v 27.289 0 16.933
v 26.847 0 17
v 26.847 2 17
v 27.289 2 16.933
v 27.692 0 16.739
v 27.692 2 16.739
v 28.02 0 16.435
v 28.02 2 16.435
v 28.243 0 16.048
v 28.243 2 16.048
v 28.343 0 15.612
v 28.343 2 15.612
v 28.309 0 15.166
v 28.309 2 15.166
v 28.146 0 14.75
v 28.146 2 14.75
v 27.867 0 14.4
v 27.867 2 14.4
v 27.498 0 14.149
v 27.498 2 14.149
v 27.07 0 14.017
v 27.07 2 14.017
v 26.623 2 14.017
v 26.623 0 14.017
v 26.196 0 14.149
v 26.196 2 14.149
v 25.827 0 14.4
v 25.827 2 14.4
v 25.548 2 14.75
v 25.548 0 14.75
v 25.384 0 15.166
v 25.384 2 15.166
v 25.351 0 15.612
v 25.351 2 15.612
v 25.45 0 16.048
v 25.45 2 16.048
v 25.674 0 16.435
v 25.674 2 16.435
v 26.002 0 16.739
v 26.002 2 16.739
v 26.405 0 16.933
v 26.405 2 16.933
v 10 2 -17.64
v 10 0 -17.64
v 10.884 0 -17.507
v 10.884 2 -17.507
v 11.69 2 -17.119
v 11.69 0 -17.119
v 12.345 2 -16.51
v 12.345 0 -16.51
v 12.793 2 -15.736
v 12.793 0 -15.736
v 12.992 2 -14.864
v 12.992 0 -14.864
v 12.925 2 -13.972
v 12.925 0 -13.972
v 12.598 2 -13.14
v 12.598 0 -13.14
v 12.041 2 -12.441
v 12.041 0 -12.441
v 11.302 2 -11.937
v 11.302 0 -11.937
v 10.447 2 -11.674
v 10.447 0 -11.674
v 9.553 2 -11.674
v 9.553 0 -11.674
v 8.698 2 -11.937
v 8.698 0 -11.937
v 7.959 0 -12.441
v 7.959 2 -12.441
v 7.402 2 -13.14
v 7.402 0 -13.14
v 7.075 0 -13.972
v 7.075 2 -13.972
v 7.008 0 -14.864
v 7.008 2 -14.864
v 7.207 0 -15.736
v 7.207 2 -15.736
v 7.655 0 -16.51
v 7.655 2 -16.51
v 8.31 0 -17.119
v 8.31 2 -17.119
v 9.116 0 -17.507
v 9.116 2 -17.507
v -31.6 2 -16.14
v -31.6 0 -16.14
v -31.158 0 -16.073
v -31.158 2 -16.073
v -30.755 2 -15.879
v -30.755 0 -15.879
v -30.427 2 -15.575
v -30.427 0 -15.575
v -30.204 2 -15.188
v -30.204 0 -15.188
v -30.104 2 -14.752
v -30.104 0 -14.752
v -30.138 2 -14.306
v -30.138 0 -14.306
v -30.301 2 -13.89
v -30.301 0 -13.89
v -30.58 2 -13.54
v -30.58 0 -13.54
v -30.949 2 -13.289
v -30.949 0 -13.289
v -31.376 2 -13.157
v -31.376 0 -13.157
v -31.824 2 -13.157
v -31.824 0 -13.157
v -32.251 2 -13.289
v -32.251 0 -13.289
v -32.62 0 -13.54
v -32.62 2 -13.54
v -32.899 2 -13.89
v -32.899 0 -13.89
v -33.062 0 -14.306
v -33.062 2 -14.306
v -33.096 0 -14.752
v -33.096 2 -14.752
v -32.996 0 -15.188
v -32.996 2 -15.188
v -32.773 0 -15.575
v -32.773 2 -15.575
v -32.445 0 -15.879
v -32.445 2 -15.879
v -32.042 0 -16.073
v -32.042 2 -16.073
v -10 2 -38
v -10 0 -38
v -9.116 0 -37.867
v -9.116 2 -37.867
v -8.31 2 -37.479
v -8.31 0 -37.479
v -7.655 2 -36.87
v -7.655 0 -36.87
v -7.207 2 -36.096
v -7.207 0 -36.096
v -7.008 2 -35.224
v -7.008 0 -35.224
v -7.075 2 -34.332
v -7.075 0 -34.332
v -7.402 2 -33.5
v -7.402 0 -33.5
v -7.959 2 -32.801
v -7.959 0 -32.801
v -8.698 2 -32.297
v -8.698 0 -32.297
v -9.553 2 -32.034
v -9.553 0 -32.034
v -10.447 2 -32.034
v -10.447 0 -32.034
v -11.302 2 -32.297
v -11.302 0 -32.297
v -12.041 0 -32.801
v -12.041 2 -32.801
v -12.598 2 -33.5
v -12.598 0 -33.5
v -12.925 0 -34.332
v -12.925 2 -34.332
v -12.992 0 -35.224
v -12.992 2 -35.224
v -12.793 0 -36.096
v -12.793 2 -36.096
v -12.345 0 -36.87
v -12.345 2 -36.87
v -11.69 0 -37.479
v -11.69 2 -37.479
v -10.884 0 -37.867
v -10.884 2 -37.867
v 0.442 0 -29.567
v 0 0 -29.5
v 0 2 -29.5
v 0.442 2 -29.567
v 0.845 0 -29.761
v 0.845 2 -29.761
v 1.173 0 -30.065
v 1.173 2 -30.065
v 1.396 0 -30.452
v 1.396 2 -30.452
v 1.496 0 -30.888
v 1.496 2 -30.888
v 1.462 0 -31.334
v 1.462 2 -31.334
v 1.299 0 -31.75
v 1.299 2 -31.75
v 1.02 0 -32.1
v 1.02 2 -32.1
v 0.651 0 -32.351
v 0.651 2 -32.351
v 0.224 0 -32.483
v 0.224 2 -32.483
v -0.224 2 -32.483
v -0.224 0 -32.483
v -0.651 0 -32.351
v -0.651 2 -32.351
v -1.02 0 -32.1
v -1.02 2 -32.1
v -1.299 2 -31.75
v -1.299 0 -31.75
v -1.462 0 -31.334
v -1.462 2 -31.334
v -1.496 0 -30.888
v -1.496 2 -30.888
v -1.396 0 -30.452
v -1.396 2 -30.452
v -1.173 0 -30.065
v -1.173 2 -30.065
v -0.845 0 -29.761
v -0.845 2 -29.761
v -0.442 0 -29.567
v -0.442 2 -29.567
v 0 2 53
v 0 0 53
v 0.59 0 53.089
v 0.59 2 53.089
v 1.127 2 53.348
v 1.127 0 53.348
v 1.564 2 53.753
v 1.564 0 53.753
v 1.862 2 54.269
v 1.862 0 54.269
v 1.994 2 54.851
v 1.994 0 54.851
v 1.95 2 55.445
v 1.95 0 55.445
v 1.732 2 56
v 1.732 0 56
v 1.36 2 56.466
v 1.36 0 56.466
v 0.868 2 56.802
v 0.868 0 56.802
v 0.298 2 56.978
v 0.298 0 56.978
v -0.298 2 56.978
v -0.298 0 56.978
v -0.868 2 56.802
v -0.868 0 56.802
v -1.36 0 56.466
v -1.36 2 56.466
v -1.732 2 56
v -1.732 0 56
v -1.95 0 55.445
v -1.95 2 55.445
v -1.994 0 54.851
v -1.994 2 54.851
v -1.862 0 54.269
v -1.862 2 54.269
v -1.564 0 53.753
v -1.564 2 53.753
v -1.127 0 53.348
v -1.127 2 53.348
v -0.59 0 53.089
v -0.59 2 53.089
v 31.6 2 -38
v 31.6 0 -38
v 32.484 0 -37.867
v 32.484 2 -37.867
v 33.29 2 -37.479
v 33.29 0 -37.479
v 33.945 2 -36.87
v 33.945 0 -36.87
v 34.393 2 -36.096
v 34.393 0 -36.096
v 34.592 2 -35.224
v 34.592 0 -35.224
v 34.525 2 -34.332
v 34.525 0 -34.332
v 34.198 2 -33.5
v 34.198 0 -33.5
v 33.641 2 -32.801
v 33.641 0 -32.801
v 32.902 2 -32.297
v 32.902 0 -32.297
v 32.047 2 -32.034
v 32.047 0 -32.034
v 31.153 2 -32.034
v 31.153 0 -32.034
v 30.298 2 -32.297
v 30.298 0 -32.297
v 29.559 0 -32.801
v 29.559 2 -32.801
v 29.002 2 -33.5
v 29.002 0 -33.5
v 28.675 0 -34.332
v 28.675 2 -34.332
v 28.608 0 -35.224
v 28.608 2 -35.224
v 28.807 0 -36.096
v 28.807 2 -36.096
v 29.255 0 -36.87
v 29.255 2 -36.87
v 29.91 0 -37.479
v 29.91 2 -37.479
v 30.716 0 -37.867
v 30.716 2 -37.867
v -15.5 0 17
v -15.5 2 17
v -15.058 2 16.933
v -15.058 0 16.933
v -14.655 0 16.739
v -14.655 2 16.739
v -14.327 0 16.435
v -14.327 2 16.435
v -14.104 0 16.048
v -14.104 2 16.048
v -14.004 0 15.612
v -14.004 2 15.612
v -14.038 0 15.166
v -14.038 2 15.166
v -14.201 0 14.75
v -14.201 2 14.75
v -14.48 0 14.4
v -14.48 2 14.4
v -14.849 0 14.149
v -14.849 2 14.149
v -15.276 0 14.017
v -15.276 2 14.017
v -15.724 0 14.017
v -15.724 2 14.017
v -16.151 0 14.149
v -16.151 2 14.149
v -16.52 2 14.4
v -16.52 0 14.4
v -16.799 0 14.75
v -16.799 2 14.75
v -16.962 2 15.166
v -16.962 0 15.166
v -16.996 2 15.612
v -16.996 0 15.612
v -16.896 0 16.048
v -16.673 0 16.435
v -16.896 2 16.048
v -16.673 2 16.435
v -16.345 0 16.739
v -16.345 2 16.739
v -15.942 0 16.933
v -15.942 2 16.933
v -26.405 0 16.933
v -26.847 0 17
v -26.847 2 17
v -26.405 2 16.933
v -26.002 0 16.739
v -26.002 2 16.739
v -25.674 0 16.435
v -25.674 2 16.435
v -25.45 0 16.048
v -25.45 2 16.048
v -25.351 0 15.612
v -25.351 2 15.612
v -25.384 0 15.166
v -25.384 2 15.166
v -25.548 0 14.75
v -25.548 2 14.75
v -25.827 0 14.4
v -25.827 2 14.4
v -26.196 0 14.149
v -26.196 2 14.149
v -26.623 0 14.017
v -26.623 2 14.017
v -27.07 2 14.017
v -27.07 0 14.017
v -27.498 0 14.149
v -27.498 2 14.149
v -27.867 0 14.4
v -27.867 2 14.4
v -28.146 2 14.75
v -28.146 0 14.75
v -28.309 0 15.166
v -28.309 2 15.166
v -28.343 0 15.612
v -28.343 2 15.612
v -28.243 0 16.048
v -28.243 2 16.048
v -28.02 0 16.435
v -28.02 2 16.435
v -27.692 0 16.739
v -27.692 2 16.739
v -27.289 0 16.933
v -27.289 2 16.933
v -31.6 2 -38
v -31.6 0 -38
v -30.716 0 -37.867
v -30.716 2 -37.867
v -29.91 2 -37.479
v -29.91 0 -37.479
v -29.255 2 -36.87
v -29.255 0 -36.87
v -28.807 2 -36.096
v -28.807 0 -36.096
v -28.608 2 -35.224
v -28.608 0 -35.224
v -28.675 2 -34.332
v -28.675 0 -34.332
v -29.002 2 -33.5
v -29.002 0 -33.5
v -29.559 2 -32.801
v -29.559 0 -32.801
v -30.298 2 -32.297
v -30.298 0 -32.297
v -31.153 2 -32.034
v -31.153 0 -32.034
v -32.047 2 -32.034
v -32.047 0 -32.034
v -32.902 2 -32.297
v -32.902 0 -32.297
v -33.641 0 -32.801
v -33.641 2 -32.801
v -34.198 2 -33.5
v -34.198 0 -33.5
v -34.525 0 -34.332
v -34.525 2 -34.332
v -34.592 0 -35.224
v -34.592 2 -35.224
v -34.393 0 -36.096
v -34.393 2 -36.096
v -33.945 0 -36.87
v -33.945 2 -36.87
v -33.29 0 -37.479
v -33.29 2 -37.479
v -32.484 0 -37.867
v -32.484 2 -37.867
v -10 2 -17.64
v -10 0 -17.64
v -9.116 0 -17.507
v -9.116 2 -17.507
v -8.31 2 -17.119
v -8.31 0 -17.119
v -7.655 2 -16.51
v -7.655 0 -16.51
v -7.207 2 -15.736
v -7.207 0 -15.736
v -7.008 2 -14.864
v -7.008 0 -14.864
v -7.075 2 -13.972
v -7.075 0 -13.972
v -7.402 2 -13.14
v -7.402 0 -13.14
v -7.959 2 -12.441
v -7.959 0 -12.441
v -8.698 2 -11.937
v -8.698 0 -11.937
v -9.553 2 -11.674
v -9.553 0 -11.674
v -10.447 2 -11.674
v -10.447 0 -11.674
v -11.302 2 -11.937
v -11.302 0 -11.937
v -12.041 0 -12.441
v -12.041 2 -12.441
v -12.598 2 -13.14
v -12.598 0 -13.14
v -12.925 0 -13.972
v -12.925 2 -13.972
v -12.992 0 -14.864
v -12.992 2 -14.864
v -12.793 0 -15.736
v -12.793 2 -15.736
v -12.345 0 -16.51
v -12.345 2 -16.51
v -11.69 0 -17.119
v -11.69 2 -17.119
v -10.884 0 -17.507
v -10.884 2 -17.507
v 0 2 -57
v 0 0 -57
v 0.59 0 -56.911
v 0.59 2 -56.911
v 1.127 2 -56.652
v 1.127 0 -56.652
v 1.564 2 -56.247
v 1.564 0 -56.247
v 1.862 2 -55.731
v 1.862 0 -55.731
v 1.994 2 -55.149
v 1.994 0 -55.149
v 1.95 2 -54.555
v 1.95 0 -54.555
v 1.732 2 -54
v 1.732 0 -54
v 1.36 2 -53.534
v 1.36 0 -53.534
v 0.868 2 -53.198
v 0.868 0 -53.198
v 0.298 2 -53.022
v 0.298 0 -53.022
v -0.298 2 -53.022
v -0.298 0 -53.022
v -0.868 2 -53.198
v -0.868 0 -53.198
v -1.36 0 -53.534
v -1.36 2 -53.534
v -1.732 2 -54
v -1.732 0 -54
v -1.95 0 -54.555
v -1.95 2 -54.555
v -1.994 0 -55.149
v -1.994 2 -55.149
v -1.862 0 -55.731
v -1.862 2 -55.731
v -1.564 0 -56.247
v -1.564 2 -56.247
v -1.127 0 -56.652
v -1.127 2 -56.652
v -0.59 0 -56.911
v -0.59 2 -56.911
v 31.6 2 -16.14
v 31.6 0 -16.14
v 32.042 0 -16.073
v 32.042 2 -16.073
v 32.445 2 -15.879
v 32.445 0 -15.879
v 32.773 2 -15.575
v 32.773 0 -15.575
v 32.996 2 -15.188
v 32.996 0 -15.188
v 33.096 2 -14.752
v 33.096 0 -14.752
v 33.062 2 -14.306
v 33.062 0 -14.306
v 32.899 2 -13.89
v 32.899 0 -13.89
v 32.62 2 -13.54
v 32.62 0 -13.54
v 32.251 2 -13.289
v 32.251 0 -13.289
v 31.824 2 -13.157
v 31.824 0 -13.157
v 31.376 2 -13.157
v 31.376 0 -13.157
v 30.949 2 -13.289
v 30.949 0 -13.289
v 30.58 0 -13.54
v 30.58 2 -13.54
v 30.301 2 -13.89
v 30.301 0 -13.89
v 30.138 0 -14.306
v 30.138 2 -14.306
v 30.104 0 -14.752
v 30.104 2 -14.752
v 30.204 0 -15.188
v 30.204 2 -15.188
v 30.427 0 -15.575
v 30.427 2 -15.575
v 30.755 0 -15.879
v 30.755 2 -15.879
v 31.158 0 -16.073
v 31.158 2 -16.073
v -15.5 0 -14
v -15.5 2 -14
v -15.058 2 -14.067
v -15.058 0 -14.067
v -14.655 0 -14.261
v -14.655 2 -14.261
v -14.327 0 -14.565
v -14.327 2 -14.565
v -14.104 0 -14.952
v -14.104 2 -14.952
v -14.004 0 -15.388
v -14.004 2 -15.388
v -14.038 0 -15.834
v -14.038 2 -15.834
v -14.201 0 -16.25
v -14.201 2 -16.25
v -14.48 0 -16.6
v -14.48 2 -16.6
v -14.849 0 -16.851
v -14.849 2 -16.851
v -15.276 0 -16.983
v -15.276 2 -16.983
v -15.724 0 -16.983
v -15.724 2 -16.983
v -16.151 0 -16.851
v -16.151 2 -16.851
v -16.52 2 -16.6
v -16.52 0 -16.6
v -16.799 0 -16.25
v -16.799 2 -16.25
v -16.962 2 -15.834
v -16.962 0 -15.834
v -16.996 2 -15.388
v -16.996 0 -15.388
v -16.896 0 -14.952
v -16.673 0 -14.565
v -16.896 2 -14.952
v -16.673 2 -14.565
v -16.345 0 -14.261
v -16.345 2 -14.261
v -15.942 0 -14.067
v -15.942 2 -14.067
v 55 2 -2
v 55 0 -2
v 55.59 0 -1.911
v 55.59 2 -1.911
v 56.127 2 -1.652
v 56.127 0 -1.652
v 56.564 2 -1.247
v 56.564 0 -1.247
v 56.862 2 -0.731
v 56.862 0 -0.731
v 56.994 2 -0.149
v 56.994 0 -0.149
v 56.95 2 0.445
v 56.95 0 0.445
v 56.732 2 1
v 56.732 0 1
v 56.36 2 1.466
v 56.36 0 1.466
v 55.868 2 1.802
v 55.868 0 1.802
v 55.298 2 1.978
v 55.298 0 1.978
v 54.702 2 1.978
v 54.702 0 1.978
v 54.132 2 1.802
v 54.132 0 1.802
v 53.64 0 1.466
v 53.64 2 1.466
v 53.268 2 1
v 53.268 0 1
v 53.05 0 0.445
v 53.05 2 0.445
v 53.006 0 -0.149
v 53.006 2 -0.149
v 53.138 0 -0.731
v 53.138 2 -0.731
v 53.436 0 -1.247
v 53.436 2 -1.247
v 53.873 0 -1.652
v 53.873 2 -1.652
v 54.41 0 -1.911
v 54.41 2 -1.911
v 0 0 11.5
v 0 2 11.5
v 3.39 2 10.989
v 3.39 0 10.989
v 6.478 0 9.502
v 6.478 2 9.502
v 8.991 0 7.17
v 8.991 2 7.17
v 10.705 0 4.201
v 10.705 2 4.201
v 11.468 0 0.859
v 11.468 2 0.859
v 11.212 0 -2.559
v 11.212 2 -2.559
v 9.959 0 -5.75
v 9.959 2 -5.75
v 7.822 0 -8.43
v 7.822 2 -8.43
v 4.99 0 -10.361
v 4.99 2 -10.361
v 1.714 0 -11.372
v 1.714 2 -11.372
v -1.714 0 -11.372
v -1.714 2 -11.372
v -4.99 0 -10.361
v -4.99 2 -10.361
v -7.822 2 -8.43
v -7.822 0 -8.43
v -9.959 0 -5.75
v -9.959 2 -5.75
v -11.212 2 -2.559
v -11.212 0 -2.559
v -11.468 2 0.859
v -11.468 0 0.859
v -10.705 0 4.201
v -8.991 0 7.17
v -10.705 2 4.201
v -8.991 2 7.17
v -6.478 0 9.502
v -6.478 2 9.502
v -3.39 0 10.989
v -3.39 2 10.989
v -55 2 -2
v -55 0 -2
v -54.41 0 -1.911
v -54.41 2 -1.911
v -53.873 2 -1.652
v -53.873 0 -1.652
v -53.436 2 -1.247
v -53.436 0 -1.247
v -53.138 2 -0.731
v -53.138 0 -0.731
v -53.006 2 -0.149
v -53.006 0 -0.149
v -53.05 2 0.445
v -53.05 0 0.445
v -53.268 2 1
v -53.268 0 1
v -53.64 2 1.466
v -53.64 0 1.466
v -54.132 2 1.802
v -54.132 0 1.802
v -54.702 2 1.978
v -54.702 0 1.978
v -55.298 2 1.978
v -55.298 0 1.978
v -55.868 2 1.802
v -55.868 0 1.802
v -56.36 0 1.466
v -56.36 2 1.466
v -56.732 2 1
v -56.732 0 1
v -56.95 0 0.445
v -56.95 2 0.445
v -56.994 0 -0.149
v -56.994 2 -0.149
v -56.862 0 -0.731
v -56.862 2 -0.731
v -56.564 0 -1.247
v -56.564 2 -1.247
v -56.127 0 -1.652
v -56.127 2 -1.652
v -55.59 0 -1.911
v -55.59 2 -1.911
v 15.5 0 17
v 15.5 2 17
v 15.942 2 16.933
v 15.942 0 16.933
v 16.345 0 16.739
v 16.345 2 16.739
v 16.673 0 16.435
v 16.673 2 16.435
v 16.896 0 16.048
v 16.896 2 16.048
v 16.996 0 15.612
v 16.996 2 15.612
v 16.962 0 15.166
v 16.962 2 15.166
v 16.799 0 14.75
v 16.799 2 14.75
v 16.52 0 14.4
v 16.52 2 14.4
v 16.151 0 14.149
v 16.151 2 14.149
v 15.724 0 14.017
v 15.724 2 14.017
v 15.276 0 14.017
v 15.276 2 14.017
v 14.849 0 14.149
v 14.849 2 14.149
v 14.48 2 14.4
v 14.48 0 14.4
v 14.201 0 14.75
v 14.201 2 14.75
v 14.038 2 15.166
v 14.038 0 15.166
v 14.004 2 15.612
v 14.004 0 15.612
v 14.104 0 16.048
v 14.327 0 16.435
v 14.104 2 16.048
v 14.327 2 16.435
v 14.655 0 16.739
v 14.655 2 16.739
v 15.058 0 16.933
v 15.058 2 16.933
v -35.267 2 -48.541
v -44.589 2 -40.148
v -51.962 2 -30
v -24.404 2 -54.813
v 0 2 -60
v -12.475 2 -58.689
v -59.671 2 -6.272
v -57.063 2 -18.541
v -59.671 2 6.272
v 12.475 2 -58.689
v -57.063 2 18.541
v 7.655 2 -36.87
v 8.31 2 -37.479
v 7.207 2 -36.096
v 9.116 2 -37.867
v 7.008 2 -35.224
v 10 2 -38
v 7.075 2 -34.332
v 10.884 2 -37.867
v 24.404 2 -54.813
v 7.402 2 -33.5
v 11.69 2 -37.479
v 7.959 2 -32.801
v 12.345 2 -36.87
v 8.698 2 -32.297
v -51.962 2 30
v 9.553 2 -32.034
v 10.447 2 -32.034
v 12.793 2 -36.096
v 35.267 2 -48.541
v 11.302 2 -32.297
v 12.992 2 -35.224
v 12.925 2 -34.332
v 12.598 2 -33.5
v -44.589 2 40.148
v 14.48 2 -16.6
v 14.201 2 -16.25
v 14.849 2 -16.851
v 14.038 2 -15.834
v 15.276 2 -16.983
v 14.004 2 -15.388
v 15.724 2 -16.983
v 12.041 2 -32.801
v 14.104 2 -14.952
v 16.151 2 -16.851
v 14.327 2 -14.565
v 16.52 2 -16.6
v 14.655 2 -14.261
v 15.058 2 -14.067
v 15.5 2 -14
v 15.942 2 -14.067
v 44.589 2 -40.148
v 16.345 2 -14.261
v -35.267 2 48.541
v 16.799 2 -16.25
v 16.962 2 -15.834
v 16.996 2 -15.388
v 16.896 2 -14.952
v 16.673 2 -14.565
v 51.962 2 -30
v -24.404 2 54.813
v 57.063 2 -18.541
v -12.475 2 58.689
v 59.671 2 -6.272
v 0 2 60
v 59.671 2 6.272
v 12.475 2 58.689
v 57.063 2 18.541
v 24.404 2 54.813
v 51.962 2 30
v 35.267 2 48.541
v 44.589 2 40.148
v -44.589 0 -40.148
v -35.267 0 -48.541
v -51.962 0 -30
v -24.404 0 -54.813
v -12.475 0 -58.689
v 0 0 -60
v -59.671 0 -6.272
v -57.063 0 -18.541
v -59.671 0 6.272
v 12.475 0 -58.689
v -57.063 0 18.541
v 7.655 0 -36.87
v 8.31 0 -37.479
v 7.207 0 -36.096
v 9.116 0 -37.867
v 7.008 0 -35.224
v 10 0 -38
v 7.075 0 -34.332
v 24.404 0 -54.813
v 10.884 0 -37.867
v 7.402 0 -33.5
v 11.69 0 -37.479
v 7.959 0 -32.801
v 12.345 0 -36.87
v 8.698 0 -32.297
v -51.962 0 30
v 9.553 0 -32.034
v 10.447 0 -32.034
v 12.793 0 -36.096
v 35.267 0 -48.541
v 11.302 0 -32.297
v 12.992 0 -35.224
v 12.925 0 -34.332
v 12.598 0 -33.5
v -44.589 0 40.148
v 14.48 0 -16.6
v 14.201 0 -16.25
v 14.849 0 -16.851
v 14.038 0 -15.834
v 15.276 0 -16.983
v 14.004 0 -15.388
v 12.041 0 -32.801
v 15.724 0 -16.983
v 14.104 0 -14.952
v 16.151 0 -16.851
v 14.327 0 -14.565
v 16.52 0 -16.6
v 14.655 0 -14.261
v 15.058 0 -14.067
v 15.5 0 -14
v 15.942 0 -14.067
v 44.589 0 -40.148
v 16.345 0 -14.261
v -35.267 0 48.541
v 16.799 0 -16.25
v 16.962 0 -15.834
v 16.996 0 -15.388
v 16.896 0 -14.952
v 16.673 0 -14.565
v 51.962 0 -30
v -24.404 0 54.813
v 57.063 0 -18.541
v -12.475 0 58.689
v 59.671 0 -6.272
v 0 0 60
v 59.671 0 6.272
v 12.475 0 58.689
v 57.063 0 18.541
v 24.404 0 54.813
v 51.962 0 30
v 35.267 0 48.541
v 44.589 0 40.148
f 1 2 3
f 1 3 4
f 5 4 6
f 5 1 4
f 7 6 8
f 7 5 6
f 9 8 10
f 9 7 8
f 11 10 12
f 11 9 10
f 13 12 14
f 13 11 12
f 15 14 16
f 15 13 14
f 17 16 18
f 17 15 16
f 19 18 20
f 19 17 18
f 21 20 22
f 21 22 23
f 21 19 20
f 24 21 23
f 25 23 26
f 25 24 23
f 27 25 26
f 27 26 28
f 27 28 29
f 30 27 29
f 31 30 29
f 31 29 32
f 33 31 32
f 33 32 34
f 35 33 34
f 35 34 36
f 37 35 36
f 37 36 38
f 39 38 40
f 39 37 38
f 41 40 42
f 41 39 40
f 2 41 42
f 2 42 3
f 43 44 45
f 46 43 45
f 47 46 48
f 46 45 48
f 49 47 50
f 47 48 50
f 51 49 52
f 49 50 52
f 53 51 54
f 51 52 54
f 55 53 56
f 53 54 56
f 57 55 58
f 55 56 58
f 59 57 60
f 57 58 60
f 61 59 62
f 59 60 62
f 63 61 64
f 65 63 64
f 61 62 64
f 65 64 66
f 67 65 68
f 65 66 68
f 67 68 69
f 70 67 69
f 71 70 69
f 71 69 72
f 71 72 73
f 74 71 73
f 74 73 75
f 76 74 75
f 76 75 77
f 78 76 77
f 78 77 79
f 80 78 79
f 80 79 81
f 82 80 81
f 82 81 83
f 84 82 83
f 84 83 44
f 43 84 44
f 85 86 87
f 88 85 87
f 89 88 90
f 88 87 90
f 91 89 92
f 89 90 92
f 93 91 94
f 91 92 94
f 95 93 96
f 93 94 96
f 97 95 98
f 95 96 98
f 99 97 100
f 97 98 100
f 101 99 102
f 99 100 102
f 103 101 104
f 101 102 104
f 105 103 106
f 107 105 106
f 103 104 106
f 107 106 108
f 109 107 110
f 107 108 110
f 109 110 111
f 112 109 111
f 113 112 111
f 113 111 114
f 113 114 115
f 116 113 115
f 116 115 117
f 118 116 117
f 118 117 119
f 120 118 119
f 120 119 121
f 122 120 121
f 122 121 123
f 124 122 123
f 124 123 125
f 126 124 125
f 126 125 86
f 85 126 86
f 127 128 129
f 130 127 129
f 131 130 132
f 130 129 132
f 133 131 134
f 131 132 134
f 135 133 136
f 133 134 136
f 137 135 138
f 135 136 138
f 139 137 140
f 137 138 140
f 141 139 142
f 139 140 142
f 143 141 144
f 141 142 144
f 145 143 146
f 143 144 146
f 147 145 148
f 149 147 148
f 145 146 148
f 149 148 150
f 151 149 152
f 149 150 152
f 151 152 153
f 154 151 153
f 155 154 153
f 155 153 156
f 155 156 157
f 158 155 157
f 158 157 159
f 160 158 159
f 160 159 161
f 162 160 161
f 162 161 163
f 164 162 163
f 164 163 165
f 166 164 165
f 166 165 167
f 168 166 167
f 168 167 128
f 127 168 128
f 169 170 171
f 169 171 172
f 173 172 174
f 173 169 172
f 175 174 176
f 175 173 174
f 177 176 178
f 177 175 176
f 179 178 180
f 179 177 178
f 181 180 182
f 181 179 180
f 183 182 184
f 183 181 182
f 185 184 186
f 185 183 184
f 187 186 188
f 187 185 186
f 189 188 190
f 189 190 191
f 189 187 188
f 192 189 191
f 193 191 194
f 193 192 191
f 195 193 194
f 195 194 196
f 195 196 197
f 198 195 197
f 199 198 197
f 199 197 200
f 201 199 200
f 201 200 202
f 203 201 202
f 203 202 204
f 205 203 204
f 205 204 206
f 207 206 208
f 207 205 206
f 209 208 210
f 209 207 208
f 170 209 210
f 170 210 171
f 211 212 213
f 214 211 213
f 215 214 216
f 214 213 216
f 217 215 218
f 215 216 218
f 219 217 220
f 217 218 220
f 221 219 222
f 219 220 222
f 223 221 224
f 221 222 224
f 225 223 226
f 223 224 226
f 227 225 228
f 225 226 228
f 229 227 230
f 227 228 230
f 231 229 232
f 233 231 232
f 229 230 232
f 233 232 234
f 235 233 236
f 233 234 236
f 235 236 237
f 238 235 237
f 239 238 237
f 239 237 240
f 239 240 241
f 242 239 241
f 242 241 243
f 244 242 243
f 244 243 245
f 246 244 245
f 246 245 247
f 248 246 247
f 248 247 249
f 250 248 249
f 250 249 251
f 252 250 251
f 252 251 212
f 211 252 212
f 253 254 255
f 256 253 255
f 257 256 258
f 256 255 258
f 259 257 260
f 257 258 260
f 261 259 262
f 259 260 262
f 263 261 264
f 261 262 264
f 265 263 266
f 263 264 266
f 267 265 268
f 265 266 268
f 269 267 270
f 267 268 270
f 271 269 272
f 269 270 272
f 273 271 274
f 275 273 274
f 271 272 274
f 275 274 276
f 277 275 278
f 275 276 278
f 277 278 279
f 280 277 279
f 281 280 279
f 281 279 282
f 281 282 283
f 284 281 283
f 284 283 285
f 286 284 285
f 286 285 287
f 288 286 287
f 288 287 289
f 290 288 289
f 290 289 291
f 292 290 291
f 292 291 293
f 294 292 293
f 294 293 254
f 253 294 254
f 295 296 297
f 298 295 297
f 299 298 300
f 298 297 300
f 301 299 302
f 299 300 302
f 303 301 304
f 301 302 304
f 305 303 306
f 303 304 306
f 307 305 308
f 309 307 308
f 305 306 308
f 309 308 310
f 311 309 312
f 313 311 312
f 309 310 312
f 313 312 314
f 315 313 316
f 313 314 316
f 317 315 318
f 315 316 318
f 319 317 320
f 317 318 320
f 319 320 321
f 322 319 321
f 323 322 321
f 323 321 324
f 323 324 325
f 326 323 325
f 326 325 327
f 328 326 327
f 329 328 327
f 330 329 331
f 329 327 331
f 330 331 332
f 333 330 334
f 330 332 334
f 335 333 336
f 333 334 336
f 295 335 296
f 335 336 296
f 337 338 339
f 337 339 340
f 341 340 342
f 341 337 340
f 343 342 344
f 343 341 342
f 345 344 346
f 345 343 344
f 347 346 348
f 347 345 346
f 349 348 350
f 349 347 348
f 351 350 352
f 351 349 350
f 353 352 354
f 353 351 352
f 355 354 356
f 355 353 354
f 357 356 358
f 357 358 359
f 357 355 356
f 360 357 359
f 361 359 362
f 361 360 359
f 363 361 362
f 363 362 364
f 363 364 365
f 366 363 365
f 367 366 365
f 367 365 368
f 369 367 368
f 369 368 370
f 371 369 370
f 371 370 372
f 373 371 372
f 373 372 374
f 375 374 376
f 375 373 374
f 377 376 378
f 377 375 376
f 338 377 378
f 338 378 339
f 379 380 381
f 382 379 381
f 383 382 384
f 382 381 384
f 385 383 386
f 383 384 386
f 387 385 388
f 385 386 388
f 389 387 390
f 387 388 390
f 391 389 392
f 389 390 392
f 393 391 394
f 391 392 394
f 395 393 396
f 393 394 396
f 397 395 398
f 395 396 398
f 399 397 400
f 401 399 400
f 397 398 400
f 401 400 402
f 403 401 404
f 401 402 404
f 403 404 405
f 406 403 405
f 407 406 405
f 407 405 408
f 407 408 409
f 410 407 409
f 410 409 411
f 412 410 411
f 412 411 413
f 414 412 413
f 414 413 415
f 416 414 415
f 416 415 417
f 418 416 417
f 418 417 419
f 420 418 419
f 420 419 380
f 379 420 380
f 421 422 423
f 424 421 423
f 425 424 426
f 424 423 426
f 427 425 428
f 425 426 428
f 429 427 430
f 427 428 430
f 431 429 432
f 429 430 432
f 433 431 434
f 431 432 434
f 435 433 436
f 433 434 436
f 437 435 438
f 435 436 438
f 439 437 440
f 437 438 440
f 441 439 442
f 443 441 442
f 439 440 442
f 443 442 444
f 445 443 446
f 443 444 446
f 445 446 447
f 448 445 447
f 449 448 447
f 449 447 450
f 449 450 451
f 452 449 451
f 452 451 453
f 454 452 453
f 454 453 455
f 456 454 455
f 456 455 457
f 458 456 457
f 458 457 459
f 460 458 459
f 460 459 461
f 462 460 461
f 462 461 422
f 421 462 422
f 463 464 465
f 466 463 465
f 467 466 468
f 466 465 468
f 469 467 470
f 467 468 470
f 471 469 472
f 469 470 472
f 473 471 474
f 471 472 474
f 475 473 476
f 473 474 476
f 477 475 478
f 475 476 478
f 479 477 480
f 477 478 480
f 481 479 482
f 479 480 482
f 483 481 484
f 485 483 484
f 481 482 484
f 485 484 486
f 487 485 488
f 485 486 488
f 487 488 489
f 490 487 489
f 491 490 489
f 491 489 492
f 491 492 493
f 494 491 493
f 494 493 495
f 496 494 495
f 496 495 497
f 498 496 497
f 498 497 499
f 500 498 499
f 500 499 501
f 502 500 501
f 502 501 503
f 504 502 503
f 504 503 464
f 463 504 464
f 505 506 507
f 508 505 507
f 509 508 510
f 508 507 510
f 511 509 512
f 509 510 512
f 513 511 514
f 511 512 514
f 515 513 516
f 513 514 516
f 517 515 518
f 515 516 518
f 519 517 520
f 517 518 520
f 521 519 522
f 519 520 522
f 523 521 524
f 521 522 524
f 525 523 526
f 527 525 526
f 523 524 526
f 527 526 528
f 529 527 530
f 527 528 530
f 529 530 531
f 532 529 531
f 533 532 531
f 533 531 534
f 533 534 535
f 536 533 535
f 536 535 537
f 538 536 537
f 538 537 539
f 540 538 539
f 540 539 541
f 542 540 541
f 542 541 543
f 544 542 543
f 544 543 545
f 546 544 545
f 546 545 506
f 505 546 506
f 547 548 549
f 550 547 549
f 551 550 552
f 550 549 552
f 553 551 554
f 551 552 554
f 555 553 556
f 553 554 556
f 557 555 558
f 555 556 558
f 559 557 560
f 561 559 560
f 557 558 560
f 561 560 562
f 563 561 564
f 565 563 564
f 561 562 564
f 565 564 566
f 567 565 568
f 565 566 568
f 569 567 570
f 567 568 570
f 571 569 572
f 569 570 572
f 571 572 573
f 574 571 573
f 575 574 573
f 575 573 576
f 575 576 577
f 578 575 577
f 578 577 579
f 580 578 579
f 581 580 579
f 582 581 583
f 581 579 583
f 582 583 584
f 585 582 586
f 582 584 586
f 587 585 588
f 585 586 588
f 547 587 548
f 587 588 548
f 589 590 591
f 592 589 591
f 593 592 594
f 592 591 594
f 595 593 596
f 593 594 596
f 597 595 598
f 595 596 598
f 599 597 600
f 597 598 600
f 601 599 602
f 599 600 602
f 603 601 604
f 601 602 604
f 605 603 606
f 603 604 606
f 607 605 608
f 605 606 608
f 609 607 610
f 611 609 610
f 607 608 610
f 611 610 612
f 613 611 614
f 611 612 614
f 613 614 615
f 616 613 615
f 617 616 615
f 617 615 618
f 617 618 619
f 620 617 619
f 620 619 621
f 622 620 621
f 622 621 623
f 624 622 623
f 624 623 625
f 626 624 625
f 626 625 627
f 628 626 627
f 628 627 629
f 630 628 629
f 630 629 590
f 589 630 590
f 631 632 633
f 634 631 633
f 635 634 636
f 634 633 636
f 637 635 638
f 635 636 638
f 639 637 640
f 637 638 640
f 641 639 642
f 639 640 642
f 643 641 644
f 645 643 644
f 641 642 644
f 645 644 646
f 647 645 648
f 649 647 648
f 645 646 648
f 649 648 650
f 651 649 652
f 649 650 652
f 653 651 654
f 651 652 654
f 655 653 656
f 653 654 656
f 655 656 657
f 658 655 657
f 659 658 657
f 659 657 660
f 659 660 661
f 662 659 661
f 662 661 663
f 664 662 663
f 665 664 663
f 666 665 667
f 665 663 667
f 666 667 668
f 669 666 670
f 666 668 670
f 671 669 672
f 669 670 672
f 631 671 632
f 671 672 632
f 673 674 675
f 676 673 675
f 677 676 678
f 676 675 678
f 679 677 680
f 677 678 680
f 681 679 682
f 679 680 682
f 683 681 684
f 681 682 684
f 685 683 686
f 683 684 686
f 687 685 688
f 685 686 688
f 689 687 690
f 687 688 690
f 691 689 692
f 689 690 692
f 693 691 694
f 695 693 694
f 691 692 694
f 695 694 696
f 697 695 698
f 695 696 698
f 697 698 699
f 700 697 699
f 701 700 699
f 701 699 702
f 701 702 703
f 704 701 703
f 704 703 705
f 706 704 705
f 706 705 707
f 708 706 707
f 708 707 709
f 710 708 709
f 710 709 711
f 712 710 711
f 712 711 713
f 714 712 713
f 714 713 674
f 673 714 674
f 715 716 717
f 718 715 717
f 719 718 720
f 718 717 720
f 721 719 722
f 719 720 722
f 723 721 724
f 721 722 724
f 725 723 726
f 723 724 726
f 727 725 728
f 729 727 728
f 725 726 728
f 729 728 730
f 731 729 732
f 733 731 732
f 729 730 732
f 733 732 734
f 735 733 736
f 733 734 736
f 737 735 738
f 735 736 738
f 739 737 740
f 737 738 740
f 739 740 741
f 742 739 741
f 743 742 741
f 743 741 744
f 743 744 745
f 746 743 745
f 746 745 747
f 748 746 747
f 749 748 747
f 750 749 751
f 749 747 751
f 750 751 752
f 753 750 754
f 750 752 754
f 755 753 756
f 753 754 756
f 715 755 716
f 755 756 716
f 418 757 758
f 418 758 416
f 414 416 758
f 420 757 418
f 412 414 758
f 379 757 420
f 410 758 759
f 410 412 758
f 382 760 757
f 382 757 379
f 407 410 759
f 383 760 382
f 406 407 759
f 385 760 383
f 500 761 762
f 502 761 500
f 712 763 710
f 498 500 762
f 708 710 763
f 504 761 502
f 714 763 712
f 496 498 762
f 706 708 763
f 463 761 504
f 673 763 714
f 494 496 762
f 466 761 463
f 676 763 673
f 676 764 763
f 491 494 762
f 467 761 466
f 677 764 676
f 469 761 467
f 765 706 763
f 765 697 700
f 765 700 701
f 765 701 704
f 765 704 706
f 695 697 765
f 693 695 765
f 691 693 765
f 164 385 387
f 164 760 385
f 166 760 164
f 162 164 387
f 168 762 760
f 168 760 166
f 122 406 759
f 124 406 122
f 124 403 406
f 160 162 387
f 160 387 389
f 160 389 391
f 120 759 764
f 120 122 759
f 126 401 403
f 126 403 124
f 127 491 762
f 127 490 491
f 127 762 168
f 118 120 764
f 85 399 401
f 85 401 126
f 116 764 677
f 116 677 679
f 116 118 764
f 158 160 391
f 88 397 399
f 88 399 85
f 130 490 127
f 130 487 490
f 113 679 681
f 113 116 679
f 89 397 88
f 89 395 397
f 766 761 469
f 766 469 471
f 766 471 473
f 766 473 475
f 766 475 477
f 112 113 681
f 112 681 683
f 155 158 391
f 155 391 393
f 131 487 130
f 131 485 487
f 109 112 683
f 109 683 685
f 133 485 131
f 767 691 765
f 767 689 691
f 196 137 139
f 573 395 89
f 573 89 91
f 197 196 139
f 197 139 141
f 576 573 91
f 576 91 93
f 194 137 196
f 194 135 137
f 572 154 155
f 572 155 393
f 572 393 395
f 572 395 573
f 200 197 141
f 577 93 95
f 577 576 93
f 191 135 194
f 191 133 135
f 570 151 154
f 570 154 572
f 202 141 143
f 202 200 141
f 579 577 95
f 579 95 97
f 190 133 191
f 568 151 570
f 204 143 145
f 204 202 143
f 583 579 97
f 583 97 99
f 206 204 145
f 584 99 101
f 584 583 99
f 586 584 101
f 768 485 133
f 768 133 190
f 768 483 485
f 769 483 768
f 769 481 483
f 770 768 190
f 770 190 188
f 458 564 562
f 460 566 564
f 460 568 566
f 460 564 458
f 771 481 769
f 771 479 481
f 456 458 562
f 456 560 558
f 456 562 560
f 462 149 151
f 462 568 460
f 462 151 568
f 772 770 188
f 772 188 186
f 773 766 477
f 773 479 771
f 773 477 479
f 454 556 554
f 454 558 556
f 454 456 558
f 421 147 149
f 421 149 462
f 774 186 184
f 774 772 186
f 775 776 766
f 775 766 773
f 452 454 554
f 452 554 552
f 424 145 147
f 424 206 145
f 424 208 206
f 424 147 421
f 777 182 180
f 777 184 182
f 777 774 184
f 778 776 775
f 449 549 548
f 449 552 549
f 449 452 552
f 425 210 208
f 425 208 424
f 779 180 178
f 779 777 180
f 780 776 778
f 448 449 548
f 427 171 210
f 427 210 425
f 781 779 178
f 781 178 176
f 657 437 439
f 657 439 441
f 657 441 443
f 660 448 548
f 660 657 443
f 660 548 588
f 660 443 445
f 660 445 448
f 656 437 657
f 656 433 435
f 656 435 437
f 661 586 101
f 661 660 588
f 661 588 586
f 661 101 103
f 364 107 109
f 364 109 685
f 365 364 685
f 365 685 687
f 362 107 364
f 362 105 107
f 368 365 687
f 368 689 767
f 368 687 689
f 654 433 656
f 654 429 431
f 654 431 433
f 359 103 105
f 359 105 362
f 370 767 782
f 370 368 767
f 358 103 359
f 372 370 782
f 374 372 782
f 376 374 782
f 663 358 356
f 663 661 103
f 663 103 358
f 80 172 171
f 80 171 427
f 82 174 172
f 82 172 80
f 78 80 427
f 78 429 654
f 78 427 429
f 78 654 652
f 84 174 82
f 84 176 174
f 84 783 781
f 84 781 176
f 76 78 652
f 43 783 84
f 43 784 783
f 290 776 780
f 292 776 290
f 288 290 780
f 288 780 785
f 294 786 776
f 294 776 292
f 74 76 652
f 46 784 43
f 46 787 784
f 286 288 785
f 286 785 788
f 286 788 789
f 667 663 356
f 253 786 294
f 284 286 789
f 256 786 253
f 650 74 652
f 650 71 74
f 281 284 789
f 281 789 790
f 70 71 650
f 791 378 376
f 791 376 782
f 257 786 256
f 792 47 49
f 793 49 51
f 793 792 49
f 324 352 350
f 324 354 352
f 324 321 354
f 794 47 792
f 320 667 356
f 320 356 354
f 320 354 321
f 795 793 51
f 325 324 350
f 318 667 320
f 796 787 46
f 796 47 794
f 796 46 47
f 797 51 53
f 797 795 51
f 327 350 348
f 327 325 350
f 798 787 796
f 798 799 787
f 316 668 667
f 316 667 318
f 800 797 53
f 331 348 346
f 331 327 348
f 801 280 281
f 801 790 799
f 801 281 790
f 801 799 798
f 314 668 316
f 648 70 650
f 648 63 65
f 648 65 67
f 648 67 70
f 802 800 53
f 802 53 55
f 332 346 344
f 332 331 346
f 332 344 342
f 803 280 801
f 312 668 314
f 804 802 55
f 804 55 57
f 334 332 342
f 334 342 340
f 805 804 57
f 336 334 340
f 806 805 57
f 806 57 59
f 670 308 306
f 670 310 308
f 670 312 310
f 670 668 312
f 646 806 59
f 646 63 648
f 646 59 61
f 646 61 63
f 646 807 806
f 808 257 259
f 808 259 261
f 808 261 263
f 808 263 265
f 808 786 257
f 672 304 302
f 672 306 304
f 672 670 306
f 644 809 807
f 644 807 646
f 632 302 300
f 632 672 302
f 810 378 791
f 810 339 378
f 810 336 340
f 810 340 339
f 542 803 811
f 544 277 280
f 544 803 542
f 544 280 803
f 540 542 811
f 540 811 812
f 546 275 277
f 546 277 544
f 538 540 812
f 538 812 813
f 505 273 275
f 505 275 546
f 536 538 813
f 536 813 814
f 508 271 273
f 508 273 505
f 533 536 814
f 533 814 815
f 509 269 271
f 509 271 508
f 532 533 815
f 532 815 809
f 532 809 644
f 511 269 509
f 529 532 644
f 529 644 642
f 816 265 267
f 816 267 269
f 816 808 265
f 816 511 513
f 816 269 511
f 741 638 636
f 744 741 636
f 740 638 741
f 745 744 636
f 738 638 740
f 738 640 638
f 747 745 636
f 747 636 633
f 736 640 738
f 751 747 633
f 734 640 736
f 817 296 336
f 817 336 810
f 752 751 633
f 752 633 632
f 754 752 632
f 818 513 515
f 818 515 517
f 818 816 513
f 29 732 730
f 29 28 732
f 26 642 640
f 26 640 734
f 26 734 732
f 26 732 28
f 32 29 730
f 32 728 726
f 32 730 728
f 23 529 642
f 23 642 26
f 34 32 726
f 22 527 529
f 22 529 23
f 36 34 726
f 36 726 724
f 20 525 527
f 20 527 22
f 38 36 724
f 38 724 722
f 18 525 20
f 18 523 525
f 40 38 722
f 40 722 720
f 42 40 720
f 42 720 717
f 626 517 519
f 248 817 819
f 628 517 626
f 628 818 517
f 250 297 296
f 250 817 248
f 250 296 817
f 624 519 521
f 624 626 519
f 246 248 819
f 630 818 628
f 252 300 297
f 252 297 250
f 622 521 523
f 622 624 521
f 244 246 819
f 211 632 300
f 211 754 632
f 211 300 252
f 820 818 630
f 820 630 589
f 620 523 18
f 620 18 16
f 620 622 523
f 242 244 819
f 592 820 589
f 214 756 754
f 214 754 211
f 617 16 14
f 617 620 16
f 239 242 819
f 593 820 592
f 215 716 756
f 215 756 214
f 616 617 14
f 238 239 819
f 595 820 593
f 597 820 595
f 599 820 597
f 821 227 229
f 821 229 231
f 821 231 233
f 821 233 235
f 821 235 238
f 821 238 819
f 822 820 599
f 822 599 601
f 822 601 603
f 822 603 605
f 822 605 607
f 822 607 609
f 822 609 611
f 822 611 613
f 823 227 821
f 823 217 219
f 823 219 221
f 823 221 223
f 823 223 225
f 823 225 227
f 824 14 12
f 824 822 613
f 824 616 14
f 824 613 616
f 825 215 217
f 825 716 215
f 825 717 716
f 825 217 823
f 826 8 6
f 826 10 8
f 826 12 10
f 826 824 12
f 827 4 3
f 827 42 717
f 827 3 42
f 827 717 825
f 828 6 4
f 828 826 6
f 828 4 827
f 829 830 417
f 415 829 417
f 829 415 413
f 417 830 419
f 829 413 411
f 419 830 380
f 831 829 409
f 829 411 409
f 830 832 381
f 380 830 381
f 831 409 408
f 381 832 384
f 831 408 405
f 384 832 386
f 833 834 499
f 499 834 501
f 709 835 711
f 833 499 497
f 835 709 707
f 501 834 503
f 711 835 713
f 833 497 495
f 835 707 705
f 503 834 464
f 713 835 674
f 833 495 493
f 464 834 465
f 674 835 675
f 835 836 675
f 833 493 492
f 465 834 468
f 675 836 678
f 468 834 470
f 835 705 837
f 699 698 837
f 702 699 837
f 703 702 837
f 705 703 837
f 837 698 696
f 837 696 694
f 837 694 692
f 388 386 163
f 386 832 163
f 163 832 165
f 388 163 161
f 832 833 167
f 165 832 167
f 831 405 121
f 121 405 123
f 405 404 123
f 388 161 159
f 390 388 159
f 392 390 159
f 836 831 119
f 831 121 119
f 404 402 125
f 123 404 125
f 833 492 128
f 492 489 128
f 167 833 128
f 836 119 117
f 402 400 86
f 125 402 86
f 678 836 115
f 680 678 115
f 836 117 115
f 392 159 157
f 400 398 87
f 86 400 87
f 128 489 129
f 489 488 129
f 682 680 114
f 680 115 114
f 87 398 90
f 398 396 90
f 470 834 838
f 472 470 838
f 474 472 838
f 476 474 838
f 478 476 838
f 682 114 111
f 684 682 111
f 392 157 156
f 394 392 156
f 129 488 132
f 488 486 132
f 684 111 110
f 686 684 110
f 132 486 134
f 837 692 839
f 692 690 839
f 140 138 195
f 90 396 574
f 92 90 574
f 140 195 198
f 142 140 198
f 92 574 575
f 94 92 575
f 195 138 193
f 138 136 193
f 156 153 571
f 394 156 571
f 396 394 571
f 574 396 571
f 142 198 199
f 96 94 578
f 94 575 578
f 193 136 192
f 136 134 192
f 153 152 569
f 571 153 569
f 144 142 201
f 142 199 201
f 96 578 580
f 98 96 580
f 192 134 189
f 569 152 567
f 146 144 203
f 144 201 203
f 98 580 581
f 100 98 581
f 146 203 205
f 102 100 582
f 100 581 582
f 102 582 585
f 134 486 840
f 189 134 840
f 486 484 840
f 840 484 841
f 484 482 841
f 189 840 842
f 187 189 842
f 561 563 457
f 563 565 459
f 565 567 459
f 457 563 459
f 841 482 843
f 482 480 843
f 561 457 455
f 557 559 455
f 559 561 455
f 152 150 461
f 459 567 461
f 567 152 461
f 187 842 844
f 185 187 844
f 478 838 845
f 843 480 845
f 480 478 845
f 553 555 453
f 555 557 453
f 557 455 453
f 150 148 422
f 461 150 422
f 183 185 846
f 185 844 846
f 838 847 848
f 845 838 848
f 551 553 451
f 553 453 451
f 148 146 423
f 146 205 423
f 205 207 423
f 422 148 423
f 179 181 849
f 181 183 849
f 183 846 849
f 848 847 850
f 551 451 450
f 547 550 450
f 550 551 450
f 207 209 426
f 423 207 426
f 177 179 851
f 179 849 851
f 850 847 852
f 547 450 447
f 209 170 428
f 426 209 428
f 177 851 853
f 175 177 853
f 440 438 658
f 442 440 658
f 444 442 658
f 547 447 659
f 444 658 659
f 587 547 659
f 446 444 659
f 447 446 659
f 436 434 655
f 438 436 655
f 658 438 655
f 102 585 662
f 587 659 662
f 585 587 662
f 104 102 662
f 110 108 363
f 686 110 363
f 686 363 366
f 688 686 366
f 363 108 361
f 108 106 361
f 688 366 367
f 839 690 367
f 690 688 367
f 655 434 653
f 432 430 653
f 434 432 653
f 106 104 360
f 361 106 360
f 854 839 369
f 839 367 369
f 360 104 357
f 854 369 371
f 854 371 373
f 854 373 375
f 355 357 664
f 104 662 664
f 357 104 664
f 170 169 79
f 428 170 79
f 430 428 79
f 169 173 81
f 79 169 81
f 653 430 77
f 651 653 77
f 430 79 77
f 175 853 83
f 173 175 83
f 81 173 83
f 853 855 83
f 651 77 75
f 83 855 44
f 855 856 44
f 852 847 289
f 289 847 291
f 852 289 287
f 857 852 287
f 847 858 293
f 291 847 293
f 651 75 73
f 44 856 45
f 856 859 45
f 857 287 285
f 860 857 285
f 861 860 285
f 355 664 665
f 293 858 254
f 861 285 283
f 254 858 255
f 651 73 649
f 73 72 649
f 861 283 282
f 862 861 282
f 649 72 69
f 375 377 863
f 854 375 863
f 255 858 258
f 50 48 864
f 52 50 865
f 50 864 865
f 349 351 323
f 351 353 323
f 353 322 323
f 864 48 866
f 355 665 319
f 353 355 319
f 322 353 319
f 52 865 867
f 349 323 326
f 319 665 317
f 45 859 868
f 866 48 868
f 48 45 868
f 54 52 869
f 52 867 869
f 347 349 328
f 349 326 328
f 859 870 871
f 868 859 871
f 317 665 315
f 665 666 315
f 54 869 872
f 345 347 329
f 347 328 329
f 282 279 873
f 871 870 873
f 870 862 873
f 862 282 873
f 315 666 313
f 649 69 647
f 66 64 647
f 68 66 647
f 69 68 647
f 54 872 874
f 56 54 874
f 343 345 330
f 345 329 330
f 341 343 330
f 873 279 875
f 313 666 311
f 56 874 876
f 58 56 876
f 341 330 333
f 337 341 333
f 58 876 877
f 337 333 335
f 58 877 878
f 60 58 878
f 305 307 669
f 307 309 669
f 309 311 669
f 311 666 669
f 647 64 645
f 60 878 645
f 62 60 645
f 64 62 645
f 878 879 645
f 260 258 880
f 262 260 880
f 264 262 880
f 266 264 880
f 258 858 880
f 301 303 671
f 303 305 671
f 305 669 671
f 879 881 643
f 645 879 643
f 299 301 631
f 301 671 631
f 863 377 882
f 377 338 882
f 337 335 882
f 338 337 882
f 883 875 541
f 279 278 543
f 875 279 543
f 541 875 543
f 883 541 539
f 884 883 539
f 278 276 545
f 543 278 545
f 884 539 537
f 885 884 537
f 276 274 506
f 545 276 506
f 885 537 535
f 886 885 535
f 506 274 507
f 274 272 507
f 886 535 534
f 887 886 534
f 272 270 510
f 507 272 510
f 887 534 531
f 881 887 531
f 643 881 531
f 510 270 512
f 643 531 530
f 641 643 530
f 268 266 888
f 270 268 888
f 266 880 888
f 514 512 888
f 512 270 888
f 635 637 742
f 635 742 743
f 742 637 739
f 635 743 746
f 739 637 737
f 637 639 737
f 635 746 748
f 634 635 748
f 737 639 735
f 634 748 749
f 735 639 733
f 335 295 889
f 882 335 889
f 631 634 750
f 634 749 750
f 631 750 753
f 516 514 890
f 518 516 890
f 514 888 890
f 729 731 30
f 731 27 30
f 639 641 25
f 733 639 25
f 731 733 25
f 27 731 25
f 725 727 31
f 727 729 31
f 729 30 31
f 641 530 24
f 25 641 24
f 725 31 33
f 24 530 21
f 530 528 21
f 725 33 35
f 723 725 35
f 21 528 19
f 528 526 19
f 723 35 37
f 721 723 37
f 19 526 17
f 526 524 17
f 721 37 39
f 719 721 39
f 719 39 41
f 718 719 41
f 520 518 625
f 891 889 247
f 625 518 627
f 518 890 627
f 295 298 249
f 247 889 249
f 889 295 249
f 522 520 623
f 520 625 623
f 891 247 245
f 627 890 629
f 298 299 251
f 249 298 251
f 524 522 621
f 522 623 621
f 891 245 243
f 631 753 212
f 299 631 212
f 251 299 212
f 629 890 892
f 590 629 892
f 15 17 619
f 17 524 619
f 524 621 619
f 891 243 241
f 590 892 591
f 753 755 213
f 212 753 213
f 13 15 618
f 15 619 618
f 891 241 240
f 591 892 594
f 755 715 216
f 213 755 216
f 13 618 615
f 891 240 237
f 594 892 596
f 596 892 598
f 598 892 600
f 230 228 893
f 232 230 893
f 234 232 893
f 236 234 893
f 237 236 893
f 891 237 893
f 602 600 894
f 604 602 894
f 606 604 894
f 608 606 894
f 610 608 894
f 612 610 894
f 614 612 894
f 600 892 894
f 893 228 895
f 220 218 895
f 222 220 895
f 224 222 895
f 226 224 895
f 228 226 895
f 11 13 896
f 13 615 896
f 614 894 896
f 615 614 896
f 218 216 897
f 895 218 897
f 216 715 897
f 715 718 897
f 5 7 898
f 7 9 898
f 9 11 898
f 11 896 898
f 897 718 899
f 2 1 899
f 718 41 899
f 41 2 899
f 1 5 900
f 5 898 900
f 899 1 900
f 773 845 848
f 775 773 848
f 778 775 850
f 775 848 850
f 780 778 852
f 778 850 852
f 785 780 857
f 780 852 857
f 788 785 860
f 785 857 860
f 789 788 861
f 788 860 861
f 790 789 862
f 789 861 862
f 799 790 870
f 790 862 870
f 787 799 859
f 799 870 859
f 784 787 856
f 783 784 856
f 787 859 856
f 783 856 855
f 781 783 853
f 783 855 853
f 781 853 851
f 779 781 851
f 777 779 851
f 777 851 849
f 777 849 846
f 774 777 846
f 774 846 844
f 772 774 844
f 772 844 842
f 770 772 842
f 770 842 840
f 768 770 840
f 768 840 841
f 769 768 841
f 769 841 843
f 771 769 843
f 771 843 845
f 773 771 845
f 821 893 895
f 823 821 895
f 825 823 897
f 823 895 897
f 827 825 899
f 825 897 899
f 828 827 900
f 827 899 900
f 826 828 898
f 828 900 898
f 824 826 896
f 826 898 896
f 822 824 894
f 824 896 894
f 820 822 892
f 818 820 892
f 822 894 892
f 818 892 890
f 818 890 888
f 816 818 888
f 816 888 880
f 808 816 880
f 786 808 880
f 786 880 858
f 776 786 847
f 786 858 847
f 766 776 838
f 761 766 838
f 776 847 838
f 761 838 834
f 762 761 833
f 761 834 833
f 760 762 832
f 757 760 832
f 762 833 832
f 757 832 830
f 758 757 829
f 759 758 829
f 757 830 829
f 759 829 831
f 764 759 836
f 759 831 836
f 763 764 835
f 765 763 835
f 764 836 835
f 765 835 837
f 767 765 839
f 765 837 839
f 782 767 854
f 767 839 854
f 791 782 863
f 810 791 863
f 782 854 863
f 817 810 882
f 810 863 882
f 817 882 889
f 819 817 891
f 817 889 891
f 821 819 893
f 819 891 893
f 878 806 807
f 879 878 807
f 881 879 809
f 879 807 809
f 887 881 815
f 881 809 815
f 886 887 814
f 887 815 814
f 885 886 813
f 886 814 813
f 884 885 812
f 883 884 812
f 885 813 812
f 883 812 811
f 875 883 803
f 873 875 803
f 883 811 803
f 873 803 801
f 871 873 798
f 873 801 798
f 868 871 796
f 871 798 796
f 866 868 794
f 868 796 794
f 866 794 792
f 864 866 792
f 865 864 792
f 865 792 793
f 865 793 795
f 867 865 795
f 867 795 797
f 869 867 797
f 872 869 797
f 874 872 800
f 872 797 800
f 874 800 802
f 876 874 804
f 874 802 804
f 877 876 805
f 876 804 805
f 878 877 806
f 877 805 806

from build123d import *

# Parameters (mm, degrees)
SKETCH_1_R          = 60
SKETCH_1_R_2        = 1.5
EXTRUDE_1_DEPTH     = 2
SKETCH_3_R          = 11.5
CUT_EXTRUDE_3_DEPTH = 2
SKETCH_4_R          = 1.5
CUT_EXTRUDE_4_DEPTH = 2
SKETCH_5_R          = 3
CUT_EXTRUDE_5_DEPTH = 10
SKETCH_6_R          = 2
CUT_EXTRUDE_6_DEPTH = 10
SKETCH_7_R          = 3
CUT_EXTRUDE_7_DEPTH = 10
SKETCH_8_R          = 3
CUT_EXTRUDE_8_DEPTH = 10
SKETCH_9_R          = 1.5
CUT_EXTRUDE_9_DEPTH = 10


with BuildPart() as part:
    # 草图1 → 凸台-拉伸1 (new body)
    with BuildSketch(Plane(origin=(0, 0, 0), x_dir=(1, 0, 0), z_dir=(0, 1, 0))):
        with Locations(Location((0, 0, 0), (0, 0, 270))):
            Circle(SKETCH_1_R)
        with Locations(Location((0, 31, 0), (0, 0, 270))):
            Circle(SKETCH_1_R_2, mode=Mode.SUBTRACT)
        with Locations(Location((26.846787517, -15.5, 0), (0, 0, 270))):
            Circle(SKETCH_1_R_2, mode=Mode.SUBTRACT)
        with Locations(Location((-26.846787517, -15.5, 0), (0, 0, 270))):
            Circle(SKETCH_1_R_2, mode=Mode.SUBTRACT)
    extrude(amount=EXTRUDE_1_DEPTH)

    # 草图3 → 切除-拉伸3 (cut)
    with BuildSketch(Plane(origin=(0, 2, 0), x_dir=(1, 0, 0), z_dir=(0, 1, 0))):
        with Locations(Location((0, 0, 0), (0, 0, 270))):
            Circle(SKETCH_3_R)
    extrude(amount=-CUT_EXTRUDE_3_DEPTH, mode=Mode.SUBTRACT)

    # 草图4 → 切除-拉伸4 (cut)
    with BuildSketch(Plane(origin=(0, 2, 0), x_dir=(1, 0, 0), z_dir=(0, 1, 0))):
        with Locations(Location((-15.5, 15.5, 0), (0, 0, 270))):
            Circle(SKETCH_4_R)
        with Locations(Location((15.5, 15.5, 0), (0, 0, 270))):
            Circle(SKETCH_4_R)
        with Locations(Location((15.5, -15.5, 0), (0, 0, 270))):
            Circle(SKETCH_4_R)
        with Locations(Location((-15.5, -15.5, 0), (0, 0, 270))):
            Circle(SKETCH_4_R)
    extrude(amount=-CUT_EXTRUDE_4_DEPTH, mode=Mode.SUBTRACT)

    # 草图5 → 切除-拉伸5 (cut)
    with BuildSketch(Plane.XZ):
        with Locations(Location((10, -14.64, 0), (0, 0, 270))):
            Circle(SKETCH_5_R)
        with Locations(Location((-10, -14.64, 0), (0, 0, 270))):
            Circle(SKETCH_5_R)
    extrude(amount=-CUT_EXTRUDE_5_DEPTH, mode=Mode.SUBTRACT)

    # 草图6 → 切除-拉伸6 (cut)
    with BuildSketch(Plane.XZ):
        with Locations(Location((0, 55, 0), (0, 0, 270))):
            Circle(SKETCH_6_R)
        with Locations(Location((55, 0, 0), (0, 0, 270))):
            Circle(SKETCH_6_R)
        with Locations(Location((0, -55, 0), (0, 0, 270))):
            Circle(SKETCH_6_R)
        with Locations(Location((-55, 0, 0), (0, 0, 270))):
            Circle(SKETCH_6_R)
    extrude(amount=-CUT_EXTRUDE_6_DEPTH, mode=Mode.SUBTRACT)

    # 草图7 → 切除-拉伸7 (cut)
    with BuildSketch(Plane.XZ):
        with Locations(Location((10, -35, 0), (0, 0, 270))):
            Circle(SKETCH_7_R)
        with Locations(Location((-10, -35, 0), (0, 0, 270))):
            Circle(SKETCH_7_R)
    extrude(amount=-CUT_EXTRUDE_7_DEPTH, mode=Mode.SUBTRACT)

    # 草图8 → 切除-拉伸8 (cut)
    with BuildSketch(Plane.XZ):
        with Locations(Location((31.6, -35, 0), (0, 0, 270))):
            Circle(SKETCH_8_R)
        with Locations(Location((-31.6, -35, 0), (0, 0, 270))):
            Circle(SKETCH_8_R)
    extrude(amount=-CUT_EXTRUDE_8_DEPTH, mode=Mode.SUBTRACT)

    # 草图9 → 切除-拉伸9 (cut)
    with BuildSketch(Plane.XZ):
        with Locations(Location((-31.6, -14.64, 0), (0, 0, 270))):
            Circle(SKETCH_9_R)
        with Locations(Location((31.6, -14.64, 0), (0, 0, 270))):
            Circle(SKETCH_9_R)
    extrude(amount=-CUT_EXTRUDE_9_DEPTH, mode=Mode.SUBTRACT)


solid = part.part
